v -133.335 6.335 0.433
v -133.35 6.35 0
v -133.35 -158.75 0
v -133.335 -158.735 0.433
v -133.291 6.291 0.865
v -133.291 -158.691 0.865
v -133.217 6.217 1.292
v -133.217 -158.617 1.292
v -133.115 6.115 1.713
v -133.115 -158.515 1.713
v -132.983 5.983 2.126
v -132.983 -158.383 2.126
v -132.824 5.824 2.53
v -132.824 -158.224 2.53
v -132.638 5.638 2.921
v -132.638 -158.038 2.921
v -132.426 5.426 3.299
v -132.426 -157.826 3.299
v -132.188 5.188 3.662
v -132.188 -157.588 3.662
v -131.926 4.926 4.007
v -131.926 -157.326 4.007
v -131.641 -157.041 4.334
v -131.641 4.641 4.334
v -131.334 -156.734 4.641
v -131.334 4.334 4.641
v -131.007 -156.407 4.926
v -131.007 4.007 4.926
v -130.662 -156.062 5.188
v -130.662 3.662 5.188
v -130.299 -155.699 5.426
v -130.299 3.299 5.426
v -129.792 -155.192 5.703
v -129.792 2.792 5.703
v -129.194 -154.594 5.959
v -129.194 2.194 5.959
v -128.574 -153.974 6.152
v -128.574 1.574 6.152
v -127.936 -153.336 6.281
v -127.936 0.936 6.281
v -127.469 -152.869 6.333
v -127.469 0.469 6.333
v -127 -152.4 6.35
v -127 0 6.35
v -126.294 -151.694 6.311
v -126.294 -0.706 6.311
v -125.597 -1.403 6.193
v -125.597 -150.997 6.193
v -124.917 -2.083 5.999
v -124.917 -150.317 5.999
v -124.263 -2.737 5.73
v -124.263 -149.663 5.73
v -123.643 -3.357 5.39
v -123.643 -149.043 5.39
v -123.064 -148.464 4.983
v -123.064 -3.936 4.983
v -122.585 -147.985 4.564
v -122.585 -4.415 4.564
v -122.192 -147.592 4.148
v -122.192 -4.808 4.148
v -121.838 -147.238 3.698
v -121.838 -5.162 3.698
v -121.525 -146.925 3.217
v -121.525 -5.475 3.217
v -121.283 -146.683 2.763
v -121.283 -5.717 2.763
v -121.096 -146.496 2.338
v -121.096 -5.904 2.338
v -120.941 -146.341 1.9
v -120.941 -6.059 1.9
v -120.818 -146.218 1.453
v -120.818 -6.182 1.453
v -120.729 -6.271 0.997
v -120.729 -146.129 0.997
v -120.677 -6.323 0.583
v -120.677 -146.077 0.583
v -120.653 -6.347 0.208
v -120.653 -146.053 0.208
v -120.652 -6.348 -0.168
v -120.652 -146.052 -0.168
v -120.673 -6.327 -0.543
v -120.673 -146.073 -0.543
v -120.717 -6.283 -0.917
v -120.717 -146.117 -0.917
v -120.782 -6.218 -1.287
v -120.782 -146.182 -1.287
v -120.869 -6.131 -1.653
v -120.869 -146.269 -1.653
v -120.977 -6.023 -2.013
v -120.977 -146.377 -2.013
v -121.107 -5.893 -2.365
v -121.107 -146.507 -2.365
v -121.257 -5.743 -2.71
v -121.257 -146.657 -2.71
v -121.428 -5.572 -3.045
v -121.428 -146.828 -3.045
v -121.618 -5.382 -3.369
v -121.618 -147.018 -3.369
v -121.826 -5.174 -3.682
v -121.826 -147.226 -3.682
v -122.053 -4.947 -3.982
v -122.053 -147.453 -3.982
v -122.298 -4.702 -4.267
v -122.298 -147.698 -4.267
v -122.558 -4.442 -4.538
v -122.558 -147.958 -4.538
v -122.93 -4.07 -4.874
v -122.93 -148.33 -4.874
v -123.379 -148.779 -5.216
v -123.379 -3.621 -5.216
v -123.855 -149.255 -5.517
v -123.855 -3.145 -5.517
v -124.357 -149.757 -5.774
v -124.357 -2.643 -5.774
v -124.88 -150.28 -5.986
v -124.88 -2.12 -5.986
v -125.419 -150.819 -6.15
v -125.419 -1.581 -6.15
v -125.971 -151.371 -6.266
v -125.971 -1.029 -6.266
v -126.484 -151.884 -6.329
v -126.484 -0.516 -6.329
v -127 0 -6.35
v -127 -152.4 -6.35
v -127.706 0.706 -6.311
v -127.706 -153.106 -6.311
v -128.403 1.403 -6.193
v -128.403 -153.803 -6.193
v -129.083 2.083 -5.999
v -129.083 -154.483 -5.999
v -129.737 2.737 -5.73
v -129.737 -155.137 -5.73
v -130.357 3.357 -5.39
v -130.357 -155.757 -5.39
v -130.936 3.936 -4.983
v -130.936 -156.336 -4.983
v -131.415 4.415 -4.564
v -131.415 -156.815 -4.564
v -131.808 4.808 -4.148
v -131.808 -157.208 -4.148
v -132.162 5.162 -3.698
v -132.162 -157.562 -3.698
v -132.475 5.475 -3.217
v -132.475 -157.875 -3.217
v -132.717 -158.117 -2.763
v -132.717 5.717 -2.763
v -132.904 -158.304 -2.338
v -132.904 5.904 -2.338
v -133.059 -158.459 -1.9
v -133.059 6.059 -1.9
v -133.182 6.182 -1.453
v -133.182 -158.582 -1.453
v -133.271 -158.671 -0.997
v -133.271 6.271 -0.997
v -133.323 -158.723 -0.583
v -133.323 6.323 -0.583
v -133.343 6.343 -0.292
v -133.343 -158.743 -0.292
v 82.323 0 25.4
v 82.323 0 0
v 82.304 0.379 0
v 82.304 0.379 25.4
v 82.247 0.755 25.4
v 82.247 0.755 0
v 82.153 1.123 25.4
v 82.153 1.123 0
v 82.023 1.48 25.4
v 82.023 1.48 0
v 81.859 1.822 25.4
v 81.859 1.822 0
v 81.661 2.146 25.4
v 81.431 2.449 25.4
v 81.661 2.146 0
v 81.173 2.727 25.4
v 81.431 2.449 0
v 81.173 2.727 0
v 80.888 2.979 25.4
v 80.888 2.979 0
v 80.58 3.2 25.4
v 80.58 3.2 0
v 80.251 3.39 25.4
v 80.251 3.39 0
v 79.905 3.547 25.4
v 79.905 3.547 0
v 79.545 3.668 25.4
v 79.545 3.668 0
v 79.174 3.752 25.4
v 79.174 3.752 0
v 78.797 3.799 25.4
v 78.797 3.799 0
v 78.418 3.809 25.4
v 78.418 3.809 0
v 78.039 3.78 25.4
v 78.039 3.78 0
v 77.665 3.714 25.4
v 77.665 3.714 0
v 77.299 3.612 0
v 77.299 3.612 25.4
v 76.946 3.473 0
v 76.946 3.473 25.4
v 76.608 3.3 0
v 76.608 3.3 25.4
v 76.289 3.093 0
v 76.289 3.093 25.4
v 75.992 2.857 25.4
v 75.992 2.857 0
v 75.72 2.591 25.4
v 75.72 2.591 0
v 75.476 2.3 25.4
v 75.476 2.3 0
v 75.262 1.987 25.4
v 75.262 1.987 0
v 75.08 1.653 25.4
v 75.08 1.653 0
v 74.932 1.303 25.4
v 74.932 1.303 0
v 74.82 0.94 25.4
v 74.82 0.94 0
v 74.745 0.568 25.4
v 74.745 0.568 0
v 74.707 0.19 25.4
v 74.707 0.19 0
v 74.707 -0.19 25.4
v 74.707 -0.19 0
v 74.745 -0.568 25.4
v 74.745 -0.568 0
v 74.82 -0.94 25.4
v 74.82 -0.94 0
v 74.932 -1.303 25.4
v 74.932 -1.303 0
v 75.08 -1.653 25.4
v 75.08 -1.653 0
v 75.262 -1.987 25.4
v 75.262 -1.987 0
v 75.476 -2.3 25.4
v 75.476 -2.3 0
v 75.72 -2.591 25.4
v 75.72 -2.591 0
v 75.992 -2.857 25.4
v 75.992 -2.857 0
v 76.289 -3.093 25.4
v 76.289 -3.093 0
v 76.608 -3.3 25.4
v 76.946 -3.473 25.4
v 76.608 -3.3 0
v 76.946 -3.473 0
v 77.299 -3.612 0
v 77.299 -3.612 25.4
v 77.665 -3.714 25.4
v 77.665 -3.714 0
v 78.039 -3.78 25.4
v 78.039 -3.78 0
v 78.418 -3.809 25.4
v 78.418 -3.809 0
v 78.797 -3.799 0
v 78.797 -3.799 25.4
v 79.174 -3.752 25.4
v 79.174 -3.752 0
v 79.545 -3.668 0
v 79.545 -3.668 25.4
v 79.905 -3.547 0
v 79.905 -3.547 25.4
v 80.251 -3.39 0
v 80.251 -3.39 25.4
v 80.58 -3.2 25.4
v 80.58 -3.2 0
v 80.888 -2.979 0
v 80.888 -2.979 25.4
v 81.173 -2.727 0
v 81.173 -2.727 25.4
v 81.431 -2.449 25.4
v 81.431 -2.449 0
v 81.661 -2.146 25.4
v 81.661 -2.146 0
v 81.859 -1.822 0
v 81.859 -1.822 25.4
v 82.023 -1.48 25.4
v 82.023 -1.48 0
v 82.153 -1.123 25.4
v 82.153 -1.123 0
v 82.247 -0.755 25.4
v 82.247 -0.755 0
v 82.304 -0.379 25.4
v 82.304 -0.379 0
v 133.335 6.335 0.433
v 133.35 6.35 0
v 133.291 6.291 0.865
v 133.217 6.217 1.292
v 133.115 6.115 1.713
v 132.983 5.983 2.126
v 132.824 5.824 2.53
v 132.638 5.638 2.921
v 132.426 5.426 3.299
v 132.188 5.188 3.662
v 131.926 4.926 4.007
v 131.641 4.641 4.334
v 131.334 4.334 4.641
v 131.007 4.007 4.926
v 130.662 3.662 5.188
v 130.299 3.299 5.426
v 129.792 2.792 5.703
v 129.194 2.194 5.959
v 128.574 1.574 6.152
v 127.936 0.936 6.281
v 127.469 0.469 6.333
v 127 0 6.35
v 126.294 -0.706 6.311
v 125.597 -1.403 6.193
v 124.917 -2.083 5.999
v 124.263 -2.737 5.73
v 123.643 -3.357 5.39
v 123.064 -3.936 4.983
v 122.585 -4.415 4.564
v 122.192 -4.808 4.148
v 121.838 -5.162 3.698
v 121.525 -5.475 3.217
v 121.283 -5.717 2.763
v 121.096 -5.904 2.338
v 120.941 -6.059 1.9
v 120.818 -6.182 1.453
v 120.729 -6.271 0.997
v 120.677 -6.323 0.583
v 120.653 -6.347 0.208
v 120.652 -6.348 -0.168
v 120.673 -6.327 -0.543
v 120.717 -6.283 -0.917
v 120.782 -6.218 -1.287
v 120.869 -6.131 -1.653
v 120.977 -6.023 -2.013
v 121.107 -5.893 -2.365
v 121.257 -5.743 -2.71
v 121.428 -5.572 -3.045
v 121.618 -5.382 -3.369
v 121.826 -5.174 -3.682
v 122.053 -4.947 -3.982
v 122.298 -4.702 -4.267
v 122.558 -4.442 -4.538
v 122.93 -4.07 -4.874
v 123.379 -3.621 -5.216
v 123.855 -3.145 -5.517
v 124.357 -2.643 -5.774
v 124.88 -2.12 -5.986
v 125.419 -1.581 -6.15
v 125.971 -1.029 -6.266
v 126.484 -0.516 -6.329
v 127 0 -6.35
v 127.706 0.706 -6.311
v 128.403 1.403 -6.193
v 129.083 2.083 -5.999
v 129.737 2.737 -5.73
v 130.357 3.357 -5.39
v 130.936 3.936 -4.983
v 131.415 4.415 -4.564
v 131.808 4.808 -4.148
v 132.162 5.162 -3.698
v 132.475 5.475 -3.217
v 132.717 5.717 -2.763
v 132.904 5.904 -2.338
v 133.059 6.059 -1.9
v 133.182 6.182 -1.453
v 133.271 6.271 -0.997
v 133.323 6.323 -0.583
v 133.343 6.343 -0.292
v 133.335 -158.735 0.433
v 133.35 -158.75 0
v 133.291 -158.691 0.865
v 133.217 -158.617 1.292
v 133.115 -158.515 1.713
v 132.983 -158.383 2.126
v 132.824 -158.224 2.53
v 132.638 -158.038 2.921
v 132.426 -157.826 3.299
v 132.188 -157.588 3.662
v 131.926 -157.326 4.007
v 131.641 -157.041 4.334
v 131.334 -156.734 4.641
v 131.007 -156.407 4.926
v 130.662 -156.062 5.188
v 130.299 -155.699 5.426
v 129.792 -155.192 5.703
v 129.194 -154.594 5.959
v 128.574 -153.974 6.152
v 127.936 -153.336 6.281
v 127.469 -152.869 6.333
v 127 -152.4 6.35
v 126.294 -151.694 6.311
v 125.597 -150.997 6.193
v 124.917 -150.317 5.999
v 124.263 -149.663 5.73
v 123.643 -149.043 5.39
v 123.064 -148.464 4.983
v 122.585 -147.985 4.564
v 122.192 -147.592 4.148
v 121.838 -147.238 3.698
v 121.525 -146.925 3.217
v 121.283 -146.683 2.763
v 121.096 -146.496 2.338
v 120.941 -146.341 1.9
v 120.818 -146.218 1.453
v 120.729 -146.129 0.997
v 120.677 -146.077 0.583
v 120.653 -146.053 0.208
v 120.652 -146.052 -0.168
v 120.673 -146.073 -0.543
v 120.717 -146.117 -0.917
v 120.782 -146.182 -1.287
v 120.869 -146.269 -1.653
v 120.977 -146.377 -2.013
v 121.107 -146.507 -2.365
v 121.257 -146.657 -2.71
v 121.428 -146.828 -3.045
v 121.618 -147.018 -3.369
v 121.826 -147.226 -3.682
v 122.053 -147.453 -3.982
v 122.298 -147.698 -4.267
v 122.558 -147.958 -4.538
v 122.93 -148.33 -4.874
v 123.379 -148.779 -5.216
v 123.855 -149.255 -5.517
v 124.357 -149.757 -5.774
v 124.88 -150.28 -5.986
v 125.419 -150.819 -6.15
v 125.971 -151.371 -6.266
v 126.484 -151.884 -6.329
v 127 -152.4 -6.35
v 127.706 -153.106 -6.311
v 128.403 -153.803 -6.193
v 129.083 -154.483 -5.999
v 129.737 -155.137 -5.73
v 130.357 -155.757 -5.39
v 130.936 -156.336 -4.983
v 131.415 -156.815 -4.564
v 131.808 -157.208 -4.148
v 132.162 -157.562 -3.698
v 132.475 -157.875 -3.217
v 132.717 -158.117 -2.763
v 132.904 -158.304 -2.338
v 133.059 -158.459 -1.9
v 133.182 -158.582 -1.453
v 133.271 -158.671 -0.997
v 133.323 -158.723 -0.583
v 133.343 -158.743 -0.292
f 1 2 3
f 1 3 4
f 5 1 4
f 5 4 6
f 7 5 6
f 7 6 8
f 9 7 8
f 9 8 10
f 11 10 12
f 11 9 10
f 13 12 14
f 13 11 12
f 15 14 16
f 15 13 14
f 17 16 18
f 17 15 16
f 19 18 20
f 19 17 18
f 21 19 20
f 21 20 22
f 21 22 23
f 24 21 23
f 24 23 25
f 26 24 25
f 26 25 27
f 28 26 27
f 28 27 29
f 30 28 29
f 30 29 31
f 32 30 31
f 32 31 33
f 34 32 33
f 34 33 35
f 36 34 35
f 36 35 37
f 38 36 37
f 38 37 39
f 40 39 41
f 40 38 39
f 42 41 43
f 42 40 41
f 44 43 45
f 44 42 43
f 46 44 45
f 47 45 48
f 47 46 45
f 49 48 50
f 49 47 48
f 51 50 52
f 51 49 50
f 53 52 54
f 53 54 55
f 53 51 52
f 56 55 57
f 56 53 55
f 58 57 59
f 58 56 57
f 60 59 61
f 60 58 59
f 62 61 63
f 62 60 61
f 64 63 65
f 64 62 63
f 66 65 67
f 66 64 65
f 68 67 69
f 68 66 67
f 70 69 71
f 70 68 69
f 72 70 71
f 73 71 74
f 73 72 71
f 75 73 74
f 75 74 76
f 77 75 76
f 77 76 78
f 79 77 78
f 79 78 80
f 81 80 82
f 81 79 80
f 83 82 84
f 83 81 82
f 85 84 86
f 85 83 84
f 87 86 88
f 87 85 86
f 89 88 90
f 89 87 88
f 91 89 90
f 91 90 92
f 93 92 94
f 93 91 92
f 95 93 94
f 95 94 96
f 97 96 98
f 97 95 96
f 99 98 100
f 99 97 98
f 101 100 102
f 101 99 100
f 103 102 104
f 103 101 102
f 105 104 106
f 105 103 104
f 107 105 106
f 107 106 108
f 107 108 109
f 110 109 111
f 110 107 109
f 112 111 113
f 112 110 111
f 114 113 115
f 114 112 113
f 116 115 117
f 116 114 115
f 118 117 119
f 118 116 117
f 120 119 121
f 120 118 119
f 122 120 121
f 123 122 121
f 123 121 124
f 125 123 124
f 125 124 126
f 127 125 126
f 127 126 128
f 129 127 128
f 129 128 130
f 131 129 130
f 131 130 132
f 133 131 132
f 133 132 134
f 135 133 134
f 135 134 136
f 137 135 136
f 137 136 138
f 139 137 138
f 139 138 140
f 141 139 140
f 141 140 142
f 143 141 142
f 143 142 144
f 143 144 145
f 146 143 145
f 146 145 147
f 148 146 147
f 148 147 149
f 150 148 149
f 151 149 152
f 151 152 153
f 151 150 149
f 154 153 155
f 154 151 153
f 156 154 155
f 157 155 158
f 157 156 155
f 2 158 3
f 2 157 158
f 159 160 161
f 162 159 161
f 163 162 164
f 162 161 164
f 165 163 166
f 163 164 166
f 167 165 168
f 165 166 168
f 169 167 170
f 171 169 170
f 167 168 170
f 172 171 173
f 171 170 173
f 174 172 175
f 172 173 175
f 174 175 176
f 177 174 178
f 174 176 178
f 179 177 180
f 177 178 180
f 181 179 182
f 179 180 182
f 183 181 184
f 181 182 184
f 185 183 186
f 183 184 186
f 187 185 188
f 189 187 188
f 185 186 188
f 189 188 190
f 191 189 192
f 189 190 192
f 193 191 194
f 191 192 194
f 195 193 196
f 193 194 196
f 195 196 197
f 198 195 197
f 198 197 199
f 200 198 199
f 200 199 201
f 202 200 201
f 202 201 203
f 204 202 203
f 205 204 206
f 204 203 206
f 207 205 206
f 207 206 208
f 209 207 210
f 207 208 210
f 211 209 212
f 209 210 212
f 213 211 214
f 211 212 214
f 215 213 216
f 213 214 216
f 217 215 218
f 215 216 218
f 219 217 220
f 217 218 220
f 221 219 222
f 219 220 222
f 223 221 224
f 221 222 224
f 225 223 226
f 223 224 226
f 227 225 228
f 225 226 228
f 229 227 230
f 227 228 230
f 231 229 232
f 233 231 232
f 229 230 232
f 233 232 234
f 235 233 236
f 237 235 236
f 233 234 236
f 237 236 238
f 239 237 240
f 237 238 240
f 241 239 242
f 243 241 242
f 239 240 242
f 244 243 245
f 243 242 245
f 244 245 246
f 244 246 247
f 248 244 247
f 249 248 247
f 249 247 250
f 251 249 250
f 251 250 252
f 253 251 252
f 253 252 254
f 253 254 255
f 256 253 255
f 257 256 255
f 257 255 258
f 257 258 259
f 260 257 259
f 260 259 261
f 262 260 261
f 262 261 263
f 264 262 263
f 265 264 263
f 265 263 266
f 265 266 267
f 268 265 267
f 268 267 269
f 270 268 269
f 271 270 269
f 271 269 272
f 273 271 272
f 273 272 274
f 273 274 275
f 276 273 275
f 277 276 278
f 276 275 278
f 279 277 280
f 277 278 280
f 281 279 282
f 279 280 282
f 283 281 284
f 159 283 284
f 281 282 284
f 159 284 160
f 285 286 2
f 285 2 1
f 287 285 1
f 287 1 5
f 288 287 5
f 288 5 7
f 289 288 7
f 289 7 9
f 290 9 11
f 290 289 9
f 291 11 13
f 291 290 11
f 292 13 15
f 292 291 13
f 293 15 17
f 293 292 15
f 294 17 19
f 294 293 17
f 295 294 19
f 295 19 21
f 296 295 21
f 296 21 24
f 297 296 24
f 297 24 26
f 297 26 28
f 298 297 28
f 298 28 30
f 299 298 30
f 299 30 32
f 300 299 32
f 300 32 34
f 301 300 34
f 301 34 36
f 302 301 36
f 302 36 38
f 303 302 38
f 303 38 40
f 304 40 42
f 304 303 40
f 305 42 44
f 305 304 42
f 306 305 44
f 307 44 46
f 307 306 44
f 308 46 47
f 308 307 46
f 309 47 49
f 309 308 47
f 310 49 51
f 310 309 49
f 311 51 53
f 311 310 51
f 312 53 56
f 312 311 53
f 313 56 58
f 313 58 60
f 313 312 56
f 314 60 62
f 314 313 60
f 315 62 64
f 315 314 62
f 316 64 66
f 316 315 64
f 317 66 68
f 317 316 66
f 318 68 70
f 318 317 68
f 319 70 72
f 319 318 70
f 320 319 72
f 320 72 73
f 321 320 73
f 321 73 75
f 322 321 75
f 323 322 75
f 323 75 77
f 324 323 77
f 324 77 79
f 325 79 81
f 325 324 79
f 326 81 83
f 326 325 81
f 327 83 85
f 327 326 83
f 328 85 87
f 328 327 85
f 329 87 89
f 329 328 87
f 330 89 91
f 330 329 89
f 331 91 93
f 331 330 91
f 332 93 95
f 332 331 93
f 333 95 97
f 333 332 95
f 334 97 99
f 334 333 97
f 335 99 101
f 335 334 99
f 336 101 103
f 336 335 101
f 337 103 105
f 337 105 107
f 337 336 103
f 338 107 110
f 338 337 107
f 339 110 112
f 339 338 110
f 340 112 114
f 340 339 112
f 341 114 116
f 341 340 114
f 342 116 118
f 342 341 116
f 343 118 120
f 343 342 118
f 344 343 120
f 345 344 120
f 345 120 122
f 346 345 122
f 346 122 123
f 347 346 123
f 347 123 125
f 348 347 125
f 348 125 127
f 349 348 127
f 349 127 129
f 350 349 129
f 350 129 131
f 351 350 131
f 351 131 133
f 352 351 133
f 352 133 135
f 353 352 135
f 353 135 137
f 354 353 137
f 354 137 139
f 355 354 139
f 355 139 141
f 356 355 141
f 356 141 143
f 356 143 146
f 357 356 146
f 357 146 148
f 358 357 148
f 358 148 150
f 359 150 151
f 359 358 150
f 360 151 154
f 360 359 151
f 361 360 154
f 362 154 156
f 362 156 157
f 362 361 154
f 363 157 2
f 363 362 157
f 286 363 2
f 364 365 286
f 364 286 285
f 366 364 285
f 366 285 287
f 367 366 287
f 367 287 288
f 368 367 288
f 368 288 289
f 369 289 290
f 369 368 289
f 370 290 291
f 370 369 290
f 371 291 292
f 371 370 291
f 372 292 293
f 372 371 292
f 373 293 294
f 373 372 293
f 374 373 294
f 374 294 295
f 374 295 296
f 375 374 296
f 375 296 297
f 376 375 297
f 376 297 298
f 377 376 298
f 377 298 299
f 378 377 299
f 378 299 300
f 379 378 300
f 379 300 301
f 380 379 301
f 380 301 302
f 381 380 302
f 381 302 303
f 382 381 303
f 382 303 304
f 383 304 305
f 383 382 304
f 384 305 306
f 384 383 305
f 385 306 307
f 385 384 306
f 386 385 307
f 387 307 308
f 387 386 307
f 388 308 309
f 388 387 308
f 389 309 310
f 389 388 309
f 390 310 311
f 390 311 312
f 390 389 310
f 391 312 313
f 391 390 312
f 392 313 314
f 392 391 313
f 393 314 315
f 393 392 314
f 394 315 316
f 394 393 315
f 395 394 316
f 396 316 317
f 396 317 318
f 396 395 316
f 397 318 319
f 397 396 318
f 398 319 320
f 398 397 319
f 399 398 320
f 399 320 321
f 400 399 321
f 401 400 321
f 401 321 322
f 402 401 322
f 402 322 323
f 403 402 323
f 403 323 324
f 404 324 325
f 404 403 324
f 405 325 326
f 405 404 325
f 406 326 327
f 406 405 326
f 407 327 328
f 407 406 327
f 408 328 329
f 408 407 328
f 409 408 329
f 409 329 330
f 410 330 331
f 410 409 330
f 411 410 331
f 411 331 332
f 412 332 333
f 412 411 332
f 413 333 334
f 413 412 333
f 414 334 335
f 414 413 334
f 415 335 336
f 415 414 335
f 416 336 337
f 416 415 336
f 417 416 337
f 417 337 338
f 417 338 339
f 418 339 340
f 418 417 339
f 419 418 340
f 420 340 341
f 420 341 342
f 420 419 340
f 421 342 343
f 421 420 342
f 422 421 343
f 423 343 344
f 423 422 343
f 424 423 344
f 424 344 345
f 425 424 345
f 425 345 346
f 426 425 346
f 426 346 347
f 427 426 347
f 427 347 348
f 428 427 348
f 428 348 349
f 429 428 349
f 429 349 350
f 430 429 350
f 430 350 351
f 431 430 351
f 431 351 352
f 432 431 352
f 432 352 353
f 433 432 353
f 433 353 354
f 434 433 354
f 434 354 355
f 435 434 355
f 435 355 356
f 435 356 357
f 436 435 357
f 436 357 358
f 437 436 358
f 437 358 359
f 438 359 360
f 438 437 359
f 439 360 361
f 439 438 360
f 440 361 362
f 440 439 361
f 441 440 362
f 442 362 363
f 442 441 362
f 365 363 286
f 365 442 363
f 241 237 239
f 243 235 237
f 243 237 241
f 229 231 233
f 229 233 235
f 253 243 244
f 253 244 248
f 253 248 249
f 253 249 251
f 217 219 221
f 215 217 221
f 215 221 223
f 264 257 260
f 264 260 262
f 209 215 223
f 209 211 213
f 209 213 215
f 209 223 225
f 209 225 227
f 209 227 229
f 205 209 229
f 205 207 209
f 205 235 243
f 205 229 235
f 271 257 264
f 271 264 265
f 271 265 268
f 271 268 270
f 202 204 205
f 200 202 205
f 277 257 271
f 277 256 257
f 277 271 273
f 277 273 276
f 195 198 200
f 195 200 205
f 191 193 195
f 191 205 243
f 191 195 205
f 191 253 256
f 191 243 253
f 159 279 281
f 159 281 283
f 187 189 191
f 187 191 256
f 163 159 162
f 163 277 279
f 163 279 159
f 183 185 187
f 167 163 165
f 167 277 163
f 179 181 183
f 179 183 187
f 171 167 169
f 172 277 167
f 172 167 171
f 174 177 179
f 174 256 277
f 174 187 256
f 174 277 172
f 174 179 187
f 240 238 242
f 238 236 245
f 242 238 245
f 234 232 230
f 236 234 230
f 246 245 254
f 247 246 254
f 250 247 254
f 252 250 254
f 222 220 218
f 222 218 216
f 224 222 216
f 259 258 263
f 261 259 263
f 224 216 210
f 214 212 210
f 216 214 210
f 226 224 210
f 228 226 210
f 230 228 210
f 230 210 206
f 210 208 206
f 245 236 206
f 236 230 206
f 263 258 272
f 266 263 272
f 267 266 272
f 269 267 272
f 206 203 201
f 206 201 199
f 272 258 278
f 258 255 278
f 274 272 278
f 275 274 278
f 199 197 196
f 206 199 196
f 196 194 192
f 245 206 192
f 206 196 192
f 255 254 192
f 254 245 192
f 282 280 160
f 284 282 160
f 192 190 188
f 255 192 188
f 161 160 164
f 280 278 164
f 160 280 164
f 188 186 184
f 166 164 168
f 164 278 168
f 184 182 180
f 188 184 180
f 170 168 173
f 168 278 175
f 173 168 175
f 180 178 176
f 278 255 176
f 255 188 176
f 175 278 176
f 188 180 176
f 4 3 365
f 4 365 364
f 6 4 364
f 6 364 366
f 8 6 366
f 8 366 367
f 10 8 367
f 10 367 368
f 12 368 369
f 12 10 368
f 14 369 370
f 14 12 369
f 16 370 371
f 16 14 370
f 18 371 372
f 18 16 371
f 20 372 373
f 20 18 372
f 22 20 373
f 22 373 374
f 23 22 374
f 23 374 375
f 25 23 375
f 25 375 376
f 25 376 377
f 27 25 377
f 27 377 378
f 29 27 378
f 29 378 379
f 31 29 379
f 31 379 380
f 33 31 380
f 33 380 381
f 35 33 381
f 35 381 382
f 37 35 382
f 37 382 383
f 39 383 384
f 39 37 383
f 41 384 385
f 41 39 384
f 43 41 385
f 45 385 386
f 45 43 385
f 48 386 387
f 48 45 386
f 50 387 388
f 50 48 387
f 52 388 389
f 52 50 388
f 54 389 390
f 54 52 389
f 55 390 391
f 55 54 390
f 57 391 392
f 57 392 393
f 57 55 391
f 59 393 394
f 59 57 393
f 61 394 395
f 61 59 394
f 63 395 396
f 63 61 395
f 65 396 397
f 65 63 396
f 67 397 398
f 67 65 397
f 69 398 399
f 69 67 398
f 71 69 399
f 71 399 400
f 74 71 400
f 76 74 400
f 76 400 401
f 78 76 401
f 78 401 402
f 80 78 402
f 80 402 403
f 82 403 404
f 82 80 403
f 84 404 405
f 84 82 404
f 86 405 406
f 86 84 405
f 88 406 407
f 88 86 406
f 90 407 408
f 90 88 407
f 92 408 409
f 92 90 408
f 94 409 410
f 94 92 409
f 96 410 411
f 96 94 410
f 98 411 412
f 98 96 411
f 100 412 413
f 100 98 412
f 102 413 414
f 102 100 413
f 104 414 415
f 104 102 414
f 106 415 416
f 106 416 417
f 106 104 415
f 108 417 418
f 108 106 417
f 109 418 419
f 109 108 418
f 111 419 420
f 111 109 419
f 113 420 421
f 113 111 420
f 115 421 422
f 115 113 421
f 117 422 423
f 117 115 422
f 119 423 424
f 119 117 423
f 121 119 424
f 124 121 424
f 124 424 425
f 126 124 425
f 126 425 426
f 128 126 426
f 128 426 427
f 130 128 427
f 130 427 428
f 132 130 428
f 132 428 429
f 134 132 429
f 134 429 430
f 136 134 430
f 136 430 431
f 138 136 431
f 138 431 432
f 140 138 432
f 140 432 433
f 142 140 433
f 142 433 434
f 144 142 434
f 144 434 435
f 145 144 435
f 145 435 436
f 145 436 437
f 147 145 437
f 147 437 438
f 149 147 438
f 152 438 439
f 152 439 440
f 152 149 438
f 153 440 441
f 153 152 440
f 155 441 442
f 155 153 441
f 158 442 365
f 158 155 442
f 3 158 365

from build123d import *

# Parameters (mm, degrees)
F0_R     = 6.35
F3_R     = 3.81
F4_DEPTH = 25.4


with BuildPart() as f2:
    # F2: sweep along a path in F1
    with BuildLine(Plane.XY) as f2_path:
        Line((0, 0), (127, 0))
        Line((127, 0), (127, -152.4))
        Line((127, -152.4), (-127, -152.4))
        Line((-127, -152.4), (-127, 0))
        Line((-127, 0), (0, 0))
    # F0 (on Right) → F2 (sweep)
    with BuildSketch(Plane.YZ):
        Circle(F0_R)
    sweep(path=f2_path.line, transition=Transition.RIGHT)


with BuildPart() as f4:
    # F3 (on Top) → F4 (new body)
    with BuildSketch(Plane.XY):
        with Locations((78.5126033376, 0)):
            Circle(F3_R)
    extrude(amount=F4_DEPTH)


solid = Compound([f2.part, f4.part])
